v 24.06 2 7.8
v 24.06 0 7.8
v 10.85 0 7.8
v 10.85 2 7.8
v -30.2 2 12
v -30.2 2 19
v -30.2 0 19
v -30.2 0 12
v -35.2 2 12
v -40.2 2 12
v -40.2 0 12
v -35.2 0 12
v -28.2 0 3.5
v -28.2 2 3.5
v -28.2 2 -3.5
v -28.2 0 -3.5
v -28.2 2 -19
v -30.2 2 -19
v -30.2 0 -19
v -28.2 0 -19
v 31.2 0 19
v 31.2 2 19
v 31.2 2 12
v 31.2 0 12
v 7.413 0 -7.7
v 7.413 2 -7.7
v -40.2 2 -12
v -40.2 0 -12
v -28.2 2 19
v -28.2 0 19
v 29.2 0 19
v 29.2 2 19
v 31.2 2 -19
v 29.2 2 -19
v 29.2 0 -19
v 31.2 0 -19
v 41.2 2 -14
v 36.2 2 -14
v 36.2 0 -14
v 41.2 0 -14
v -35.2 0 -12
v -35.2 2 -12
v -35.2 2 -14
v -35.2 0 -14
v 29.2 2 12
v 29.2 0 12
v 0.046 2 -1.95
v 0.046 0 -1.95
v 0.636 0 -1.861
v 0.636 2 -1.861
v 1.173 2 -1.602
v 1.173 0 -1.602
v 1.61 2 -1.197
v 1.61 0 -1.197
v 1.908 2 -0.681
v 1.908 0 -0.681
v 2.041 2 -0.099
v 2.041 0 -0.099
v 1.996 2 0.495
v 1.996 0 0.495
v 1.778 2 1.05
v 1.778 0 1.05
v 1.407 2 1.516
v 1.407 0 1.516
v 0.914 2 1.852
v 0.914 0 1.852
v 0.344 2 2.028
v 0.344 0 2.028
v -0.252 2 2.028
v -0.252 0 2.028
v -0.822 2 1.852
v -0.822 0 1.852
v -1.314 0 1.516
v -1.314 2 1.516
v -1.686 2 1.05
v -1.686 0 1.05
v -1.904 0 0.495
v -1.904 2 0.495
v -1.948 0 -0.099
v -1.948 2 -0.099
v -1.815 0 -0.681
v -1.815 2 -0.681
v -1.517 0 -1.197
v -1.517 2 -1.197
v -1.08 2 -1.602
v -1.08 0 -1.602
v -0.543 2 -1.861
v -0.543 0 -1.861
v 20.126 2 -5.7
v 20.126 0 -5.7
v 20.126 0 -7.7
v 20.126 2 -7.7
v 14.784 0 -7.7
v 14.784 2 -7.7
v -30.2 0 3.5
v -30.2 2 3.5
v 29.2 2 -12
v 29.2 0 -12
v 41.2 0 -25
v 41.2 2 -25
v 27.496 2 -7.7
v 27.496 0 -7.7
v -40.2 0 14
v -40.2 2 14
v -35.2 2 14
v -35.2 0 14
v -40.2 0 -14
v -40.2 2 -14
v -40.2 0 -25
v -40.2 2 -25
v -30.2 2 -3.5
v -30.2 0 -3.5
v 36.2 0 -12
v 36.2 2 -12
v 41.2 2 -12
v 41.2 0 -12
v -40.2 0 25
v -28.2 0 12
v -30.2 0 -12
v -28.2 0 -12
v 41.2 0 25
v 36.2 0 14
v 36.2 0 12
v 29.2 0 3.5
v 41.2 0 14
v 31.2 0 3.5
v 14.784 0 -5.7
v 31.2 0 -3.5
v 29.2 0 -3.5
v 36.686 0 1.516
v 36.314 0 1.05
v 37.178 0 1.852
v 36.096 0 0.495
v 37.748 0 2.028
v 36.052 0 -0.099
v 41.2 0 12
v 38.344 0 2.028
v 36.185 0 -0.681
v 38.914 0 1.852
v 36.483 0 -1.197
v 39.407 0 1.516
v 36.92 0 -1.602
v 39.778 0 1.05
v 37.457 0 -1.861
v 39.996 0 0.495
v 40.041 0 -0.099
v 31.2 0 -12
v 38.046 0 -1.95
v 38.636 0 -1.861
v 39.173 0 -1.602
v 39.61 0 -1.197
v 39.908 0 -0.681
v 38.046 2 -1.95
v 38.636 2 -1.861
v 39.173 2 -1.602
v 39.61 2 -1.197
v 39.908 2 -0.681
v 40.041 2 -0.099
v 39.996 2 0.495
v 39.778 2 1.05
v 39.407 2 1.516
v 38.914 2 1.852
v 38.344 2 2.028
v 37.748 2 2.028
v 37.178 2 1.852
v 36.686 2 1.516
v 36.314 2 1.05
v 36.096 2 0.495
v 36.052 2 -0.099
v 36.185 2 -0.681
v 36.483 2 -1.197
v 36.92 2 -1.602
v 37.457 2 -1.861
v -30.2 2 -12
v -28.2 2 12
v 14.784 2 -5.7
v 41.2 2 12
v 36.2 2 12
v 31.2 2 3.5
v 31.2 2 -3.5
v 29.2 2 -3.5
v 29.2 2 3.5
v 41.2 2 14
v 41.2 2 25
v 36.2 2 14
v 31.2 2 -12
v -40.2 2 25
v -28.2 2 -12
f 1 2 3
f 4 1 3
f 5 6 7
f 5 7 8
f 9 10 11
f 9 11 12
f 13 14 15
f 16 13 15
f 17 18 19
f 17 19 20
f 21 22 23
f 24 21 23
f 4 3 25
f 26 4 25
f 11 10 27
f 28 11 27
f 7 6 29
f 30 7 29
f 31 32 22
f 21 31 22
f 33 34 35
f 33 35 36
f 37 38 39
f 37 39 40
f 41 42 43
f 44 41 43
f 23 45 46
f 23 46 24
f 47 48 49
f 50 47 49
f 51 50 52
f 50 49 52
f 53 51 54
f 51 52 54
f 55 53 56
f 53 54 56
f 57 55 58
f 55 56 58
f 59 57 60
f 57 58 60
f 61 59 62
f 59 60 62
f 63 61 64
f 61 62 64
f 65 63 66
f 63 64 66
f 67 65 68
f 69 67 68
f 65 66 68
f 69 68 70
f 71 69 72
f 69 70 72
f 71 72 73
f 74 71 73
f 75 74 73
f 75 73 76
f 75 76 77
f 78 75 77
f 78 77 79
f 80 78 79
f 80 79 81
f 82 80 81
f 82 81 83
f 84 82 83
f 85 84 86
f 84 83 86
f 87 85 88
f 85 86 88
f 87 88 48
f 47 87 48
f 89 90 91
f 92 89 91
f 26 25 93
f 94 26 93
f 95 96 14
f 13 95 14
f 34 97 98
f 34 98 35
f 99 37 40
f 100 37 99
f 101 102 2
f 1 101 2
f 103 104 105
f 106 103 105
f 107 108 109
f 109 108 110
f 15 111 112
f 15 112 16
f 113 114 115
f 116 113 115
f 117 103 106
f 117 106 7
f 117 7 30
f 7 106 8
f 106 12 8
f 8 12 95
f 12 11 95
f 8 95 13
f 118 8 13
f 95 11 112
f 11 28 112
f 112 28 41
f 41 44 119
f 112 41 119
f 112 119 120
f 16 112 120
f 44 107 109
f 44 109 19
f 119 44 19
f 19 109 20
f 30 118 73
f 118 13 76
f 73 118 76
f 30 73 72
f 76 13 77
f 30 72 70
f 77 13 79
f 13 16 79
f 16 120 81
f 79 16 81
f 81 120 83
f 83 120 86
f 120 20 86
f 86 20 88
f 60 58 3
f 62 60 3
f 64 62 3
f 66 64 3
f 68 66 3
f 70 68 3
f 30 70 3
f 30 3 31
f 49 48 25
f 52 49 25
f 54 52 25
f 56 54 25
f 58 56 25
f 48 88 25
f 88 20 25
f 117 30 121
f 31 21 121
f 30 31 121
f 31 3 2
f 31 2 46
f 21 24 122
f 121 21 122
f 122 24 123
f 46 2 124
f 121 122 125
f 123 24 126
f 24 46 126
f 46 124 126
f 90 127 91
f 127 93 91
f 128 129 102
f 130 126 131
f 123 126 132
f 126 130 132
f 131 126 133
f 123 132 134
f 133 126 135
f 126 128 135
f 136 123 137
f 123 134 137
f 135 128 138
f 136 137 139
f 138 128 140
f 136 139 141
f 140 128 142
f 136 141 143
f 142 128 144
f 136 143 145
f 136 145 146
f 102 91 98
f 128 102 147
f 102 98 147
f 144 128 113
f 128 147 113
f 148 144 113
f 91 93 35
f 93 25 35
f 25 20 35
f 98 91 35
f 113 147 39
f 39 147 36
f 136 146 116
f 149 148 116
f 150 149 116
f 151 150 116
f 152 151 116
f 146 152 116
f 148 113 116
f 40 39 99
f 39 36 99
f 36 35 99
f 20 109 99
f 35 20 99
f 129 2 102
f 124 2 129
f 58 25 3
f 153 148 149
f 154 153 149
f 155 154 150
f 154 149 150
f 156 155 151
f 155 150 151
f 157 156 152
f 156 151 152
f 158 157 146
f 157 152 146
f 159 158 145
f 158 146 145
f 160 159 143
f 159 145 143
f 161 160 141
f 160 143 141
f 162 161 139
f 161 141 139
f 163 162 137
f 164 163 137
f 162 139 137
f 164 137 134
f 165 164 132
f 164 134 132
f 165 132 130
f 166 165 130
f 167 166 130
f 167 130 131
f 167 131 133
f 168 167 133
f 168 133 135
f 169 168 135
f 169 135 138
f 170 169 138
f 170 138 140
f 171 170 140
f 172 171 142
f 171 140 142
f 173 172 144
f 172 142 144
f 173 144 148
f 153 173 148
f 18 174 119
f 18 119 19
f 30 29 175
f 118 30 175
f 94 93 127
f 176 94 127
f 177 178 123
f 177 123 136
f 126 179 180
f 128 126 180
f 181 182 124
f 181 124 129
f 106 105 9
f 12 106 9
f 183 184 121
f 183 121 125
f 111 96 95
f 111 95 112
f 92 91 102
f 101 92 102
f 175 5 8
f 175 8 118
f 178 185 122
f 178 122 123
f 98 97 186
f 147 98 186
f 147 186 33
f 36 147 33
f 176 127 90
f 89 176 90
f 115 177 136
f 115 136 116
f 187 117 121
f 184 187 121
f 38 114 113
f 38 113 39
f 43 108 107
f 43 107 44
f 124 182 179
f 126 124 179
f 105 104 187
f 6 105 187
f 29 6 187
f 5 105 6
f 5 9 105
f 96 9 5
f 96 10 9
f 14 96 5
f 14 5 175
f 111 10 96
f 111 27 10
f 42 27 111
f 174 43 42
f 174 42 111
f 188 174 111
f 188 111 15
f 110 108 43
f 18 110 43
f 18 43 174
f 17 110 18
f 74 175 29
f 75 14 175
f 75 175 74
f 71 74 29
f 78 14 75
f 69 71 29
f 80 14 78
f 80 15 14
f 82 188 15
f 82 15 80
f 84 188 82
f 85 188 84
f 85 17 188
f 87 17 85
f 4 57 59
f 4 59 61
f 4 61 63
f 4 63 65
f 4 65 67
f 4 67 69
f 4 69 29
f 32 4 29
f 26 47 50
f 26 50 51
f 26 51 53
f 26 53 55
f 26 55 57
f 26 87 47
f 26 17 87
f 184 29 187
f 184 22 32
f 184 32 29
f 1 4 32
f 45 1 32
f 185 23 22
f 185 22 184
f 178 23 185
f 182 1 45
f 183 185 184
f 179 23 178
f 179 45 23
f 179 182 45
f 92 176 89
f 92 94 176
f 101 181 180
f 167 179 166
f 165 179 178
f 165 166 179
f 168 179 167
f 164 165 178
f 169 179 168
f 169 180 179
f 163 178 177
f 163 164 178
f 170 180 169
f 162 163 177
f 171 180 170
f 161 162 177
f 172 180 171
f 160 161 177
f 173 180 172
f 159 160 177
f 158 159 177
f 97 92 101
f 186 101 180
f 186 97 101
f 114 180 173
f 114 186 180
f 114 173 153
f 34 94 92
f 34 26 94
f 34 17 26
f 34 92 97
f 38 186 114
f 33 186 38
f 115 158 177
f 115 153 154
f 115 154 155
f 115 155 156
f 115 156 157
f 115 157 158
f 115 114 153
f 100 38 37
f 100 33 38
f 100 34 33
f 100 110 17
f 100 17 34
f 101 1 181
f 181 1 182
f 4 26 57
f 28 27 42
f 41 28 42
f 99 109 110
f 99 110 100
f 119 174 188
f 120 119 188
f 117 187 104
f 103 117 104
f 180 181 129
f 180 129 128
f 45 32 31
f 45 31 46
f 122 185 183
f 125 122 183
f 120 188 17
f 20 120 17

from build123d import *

# Parameters (mm, degrees)
SKETCH2_W           = 100
SKETCH2_H           = 50
BOSS_EXTRUDE1_DEPTH = 2
SKETCH12_W          = 9.8
SKETCH12_H          = 50
SKETCH12_W_2        = 8.8
CUT_EXTRUDE8_DEPTH  = 6
SKETCH13_W          = 2
SKETCH13_H          = 7
SKETCH13_W_2        = 5
SKETCH13_H_2        = 2
CUT_EXTRUDE10_DEPTH = 6
SKETCH14_R          = 2
CUT_EXTRUDE11_DEPTH = 2


with BuildPart() as part:
    # Sketch2 → Boss-Extrude1 (new body)
    with BuildSketch(Plane(origin=(0, 0, 0), x_dir=(1, 0, 0), z_dir=(0, 1, 0))):
        Rectangle(SKETCH2_W, SKETCH2_H)
    extrude(amount=BOSS_EXTRUDE1_DEPTH)

    # Sketch12 → Cut-Extrude8 (cut)
    with BuildSketch(Plane(origin=(0, 2, 0), x_dir=(1, 0, 0), z_dir=(0, 1, 0))):
        with Locations((-45.1, 0)):
            Rectangle(SKETCH12_W, SKETCH12_H)
        with Locations((45.6, 0)):
            Rectangle(SKETCH12_W_2, SKETCH12_H)
    extrude(amount=-CUT_EXTRUDE8_DEPTH, mode=Mode.SUBTRACT)

    # Sketch13 → Cut-Extrude10 (cut)
    with BuildSketch(Plane(origin=(0, 2, 0), x_dir=(1, 0, 0), z_dir=(0, 1, 0))):
        with Locations((-29.2, 15.5)):
            Rectangle(SKETCH13_W, SKETCH13_H)
        with Locations((-29.2, 0)):
            Rectangle(SKETCH13_W, SKETCH13_H)
        with Locations((-29.2, -15.5)):
            Rectangle(SKETCH13_W, SKETCH13_H)
        with Locations((30.2, 15.5)):
            Rectangle(SKETCH13_W, SKETCH13_H)
        with Locations((30.2, 0)):
            Rectangle(SKETCH13_W, SKETCH13_H)
        with Locations((30.2, -15.5)):
            Rectangle(SKETCH13_W, SKETCH13_H)
        with Locations((-37.7, 13)):
            Rectangle(SKETCH13_W_2, SKETCH13_H_2)
        with Locations((-37.7, -13)):
            Rectangle(SKETCH13_W_2, SKETCH13_H_2)
        with Locations((38.7, 13)):
            Rectangle(SKETCH13_W_2, SKETCH13_H_2)
        with Locations((38.7, -13)):
            Rectangle(SKETCH13_W_2, SKETCH13_H_2)
    extrude(amount=-CUT_EXTRUDE10_DEPTH, mode=Mode.SUBTRACT)

    # Sketch14 → Cut-Extrude11 (cut)
    with BuildSketch(Plane.XZ):
        Polygon((25.004318917, -5.7), (20.125716489, -5.7), (20.125716489, -7.7), (27.496267271, -7.7), (24.06, 7.8), (10.849660593, 7.8), (7.413393322, -7.7), (14.783944105, -7.7), (14.783944105, -5.7), (9.905341676, -5.7), (12.454830297, 5.8), (22.454830297, 5.8), align=None)
        Polygon((14.783944105, -5.7), (20.125716489, -5.7), (25.004318917, -5.7), (22.454830297, 5.8), (12.454830297, 5.8), (9.905341676, -5.7), align=None)
        with Locations(Location((0.046267271, 0.05, 0), (0, 0, 270))):
            Circle(SKETCH14_R)
        with Locations(Location((38.046267271, 0.05, 0), (0, 0, 270))):
            Circle(SKETCH14_R)
    extrude(amount=-CUT_EXTRUDE11_DEPTH, mode=Mode.SUBTRACT)


solid = part.part
